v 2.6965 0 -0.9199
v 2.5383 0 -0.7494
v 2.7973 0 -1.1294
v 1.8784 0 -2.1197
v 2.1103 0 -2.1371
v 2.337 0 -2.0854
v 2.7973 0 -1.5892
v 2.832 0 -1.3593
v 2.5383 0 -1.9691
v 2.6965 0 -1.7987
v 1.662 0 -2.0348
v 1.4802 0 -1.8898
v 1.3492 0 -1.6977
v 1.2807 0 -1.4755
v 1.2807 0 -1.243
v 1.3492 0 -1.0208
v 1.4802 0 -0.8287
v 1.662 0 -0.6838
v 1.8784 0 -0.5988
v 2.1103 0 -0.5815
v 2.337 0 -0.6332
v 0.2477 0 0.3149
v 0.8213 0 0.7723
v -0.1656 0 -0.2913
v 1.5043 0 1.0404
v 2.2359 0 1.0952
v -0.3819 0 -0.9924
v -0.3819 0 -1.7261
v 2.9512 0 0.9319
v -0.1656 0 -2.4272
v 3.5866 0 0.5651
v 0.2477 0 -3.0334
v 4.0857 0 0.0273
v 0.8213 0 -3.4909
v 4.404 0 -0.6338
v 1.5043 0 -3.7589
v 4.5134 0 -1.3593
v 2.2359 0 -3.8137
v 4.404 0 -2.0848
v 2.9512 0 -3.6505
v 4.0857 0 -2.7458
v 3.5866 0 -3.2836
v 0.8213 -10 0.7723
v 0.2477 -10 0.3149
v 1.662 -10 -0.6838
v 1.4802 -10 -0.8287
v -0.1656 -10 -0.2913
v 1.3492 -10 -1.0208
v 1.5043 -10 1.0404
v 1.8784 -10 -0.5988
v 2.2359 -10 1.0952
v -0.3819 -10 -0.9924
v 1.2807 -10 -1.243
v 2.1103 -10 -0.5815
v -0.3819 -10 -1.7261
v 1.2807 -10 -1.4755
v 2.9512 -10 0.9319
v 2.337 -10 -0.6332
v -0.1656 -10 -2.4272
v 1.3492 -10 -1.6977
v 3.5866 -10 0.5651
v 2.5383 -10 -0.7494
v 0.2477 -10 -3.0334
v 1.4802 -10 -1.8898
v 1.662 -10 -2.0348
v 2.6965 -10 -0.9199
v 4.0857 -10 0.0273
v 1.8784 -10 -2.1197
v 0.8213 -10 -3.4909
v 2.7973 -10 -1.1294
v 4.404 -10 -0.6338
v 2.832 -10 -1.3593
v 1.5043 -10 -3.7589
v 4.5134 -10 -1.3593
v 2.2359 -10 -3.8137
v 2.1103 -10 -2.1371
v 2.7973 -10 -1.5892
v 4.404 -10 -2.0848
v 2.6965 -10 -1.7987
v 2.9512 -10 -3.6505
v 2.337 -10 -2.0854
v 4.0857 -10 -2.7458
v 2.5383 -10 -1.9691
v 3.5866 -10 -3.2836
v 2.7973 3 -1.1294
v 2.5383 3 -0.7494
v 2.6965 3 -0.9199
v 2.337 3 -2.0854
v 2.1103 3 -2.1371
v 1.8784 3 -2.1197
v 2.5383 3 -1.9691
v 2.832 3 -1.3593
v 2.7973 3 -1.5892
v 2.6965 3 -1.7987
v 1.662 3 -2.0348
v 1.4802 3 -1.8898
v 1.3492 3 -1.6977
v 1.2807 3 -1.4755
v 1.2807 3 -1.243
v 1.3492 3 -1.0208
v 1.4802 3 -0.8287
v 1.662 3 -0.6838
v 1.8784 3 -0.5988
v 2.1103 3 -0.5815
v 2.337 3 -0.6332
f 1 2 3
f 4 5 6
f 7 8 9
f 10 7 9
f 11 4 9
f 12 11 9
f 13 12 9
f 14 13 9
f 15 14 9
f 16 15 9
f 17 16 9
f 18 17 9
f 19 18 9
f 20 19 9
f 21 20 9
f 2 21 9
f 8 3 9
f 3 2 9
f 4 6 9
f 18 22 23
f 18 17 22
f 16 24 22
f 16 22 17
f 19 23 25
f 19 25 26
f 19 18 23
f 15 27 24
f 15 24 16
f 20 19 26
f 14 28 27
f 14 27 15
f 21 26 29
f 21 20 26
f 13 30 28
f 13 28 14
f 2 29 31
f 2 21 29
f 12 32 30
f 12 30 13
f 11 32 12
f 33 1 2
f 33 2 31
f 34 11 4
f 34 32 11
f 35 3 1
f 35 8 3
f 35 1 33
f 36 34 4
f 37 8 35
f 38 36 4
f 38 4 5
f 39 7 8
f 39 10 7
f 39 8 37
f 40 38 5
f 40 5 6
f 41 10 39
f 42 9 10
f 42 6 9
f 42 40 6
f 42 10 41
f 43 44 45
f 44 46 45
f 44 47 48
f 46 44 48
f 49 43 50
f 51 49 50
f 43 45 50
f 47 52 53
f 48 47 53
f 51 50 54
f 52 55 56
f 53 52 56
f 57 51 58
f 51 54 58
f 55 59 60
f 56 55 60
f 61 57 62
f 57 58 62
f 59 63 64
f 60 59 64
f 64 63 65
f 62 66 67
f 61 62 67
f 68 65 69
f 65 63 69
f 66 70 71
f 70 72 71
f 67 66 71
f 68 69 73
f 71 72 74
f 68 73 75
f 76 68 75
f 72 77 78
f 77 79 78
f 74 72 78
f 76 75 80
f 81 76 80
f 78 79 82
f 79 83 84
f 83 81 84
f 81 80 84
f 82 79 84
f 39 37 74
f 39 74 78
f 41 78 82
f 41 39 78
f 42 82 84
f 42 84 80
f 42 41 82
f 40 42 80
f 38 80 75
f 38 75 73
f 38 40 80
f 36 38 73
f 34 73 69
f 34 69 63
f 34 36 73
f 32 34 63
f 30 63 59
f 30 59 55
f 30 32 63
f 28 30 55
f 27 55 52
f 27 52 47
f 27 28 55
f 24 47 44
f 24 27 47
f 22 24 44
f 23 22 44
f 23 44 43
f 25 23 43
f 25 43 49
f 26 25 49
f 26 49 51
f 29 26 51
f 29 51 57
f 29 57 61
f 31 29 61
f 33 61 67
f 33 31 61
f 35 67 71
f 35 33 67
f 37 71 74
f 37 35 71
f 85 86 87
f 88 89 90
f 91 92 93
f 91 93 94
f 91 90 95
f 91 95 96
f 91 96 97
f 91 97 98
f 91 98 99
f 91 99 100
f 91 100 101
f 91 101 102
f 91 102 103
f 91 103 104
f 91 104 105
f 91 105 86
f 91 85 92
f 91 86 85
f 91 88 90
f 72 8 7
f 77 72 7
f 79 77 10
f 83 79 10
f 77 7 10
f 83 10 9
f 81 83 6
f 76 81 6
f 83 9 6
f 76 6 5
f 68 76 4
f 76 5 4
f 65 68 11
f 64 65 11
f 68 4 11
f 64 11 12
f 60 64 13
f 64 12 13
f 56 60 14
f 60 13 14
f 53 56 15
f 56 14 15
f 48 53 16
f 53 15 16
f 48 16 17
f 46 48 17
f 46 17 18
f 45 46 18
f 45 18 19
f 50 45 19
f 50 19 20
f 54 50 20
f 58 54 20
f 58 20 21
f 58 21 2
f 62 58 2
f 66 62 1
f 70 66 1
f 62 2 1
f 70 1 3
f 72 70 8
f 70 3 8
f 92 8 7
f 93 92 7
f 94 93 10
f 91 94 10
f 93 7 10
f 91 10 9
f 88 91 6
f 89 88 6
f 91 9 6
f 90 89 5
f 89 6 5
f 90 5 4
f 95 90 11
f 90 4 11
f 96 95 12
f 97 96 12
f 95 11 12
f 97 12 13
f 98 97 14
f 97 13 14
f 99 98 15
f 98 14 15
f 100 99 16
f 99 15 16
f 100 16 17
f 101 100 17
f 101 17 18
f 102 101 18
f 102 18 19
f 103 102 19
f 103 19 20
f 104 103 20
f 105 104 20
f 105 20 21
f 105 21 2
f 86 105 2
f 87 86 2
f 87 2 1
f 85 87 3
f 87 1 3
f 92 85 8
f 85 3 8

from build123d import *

# Parameters (mm, degrees)
SKETCH1_R           = 0.78
BOSS_EXTRUDE2_DEPTH = 3
SKETCH1_5_R         = 2.46136009
SKETCH1_5_R_2       = 0.78
BOSS_EXTRUDE3_DEPTH = 10


with BuildPart() as part:
    # Sketch1 → Boss-Extrude2 (new body)
    with BuildSketch(Plane(origin=(0, 0, 0), x_dir=(1, 0, 0), z_dir=(0, 1, 0))):
        with Locations((2.051993992, 1.359269712)):
            Circle(SKETCH1_R)
    extrude(amount=BOSS_EXTRUDE2_DEPTH)


with BuildPart() as body_2:
    # Sketch1<5> → Boss-Extrude3 (new body)
    with BuildSketch(Plane(origin=(0, 0, 0), x_dir=(1, 0, 0), z_dir=(0, 1, 0))):
        with Locations((2.051993992, 1.359269712)):
            Circle(SKETCH1_5_R)
        with Locations((2.051993992, 1.359269712)):
            Circle(SKETCH1_5_R_2, mode=Mode.SUBTRACT)
    extrude(amount=-BOSS_EXTRUDE3_DEPTH)


solid = Compound([part.part, body_2.part])
